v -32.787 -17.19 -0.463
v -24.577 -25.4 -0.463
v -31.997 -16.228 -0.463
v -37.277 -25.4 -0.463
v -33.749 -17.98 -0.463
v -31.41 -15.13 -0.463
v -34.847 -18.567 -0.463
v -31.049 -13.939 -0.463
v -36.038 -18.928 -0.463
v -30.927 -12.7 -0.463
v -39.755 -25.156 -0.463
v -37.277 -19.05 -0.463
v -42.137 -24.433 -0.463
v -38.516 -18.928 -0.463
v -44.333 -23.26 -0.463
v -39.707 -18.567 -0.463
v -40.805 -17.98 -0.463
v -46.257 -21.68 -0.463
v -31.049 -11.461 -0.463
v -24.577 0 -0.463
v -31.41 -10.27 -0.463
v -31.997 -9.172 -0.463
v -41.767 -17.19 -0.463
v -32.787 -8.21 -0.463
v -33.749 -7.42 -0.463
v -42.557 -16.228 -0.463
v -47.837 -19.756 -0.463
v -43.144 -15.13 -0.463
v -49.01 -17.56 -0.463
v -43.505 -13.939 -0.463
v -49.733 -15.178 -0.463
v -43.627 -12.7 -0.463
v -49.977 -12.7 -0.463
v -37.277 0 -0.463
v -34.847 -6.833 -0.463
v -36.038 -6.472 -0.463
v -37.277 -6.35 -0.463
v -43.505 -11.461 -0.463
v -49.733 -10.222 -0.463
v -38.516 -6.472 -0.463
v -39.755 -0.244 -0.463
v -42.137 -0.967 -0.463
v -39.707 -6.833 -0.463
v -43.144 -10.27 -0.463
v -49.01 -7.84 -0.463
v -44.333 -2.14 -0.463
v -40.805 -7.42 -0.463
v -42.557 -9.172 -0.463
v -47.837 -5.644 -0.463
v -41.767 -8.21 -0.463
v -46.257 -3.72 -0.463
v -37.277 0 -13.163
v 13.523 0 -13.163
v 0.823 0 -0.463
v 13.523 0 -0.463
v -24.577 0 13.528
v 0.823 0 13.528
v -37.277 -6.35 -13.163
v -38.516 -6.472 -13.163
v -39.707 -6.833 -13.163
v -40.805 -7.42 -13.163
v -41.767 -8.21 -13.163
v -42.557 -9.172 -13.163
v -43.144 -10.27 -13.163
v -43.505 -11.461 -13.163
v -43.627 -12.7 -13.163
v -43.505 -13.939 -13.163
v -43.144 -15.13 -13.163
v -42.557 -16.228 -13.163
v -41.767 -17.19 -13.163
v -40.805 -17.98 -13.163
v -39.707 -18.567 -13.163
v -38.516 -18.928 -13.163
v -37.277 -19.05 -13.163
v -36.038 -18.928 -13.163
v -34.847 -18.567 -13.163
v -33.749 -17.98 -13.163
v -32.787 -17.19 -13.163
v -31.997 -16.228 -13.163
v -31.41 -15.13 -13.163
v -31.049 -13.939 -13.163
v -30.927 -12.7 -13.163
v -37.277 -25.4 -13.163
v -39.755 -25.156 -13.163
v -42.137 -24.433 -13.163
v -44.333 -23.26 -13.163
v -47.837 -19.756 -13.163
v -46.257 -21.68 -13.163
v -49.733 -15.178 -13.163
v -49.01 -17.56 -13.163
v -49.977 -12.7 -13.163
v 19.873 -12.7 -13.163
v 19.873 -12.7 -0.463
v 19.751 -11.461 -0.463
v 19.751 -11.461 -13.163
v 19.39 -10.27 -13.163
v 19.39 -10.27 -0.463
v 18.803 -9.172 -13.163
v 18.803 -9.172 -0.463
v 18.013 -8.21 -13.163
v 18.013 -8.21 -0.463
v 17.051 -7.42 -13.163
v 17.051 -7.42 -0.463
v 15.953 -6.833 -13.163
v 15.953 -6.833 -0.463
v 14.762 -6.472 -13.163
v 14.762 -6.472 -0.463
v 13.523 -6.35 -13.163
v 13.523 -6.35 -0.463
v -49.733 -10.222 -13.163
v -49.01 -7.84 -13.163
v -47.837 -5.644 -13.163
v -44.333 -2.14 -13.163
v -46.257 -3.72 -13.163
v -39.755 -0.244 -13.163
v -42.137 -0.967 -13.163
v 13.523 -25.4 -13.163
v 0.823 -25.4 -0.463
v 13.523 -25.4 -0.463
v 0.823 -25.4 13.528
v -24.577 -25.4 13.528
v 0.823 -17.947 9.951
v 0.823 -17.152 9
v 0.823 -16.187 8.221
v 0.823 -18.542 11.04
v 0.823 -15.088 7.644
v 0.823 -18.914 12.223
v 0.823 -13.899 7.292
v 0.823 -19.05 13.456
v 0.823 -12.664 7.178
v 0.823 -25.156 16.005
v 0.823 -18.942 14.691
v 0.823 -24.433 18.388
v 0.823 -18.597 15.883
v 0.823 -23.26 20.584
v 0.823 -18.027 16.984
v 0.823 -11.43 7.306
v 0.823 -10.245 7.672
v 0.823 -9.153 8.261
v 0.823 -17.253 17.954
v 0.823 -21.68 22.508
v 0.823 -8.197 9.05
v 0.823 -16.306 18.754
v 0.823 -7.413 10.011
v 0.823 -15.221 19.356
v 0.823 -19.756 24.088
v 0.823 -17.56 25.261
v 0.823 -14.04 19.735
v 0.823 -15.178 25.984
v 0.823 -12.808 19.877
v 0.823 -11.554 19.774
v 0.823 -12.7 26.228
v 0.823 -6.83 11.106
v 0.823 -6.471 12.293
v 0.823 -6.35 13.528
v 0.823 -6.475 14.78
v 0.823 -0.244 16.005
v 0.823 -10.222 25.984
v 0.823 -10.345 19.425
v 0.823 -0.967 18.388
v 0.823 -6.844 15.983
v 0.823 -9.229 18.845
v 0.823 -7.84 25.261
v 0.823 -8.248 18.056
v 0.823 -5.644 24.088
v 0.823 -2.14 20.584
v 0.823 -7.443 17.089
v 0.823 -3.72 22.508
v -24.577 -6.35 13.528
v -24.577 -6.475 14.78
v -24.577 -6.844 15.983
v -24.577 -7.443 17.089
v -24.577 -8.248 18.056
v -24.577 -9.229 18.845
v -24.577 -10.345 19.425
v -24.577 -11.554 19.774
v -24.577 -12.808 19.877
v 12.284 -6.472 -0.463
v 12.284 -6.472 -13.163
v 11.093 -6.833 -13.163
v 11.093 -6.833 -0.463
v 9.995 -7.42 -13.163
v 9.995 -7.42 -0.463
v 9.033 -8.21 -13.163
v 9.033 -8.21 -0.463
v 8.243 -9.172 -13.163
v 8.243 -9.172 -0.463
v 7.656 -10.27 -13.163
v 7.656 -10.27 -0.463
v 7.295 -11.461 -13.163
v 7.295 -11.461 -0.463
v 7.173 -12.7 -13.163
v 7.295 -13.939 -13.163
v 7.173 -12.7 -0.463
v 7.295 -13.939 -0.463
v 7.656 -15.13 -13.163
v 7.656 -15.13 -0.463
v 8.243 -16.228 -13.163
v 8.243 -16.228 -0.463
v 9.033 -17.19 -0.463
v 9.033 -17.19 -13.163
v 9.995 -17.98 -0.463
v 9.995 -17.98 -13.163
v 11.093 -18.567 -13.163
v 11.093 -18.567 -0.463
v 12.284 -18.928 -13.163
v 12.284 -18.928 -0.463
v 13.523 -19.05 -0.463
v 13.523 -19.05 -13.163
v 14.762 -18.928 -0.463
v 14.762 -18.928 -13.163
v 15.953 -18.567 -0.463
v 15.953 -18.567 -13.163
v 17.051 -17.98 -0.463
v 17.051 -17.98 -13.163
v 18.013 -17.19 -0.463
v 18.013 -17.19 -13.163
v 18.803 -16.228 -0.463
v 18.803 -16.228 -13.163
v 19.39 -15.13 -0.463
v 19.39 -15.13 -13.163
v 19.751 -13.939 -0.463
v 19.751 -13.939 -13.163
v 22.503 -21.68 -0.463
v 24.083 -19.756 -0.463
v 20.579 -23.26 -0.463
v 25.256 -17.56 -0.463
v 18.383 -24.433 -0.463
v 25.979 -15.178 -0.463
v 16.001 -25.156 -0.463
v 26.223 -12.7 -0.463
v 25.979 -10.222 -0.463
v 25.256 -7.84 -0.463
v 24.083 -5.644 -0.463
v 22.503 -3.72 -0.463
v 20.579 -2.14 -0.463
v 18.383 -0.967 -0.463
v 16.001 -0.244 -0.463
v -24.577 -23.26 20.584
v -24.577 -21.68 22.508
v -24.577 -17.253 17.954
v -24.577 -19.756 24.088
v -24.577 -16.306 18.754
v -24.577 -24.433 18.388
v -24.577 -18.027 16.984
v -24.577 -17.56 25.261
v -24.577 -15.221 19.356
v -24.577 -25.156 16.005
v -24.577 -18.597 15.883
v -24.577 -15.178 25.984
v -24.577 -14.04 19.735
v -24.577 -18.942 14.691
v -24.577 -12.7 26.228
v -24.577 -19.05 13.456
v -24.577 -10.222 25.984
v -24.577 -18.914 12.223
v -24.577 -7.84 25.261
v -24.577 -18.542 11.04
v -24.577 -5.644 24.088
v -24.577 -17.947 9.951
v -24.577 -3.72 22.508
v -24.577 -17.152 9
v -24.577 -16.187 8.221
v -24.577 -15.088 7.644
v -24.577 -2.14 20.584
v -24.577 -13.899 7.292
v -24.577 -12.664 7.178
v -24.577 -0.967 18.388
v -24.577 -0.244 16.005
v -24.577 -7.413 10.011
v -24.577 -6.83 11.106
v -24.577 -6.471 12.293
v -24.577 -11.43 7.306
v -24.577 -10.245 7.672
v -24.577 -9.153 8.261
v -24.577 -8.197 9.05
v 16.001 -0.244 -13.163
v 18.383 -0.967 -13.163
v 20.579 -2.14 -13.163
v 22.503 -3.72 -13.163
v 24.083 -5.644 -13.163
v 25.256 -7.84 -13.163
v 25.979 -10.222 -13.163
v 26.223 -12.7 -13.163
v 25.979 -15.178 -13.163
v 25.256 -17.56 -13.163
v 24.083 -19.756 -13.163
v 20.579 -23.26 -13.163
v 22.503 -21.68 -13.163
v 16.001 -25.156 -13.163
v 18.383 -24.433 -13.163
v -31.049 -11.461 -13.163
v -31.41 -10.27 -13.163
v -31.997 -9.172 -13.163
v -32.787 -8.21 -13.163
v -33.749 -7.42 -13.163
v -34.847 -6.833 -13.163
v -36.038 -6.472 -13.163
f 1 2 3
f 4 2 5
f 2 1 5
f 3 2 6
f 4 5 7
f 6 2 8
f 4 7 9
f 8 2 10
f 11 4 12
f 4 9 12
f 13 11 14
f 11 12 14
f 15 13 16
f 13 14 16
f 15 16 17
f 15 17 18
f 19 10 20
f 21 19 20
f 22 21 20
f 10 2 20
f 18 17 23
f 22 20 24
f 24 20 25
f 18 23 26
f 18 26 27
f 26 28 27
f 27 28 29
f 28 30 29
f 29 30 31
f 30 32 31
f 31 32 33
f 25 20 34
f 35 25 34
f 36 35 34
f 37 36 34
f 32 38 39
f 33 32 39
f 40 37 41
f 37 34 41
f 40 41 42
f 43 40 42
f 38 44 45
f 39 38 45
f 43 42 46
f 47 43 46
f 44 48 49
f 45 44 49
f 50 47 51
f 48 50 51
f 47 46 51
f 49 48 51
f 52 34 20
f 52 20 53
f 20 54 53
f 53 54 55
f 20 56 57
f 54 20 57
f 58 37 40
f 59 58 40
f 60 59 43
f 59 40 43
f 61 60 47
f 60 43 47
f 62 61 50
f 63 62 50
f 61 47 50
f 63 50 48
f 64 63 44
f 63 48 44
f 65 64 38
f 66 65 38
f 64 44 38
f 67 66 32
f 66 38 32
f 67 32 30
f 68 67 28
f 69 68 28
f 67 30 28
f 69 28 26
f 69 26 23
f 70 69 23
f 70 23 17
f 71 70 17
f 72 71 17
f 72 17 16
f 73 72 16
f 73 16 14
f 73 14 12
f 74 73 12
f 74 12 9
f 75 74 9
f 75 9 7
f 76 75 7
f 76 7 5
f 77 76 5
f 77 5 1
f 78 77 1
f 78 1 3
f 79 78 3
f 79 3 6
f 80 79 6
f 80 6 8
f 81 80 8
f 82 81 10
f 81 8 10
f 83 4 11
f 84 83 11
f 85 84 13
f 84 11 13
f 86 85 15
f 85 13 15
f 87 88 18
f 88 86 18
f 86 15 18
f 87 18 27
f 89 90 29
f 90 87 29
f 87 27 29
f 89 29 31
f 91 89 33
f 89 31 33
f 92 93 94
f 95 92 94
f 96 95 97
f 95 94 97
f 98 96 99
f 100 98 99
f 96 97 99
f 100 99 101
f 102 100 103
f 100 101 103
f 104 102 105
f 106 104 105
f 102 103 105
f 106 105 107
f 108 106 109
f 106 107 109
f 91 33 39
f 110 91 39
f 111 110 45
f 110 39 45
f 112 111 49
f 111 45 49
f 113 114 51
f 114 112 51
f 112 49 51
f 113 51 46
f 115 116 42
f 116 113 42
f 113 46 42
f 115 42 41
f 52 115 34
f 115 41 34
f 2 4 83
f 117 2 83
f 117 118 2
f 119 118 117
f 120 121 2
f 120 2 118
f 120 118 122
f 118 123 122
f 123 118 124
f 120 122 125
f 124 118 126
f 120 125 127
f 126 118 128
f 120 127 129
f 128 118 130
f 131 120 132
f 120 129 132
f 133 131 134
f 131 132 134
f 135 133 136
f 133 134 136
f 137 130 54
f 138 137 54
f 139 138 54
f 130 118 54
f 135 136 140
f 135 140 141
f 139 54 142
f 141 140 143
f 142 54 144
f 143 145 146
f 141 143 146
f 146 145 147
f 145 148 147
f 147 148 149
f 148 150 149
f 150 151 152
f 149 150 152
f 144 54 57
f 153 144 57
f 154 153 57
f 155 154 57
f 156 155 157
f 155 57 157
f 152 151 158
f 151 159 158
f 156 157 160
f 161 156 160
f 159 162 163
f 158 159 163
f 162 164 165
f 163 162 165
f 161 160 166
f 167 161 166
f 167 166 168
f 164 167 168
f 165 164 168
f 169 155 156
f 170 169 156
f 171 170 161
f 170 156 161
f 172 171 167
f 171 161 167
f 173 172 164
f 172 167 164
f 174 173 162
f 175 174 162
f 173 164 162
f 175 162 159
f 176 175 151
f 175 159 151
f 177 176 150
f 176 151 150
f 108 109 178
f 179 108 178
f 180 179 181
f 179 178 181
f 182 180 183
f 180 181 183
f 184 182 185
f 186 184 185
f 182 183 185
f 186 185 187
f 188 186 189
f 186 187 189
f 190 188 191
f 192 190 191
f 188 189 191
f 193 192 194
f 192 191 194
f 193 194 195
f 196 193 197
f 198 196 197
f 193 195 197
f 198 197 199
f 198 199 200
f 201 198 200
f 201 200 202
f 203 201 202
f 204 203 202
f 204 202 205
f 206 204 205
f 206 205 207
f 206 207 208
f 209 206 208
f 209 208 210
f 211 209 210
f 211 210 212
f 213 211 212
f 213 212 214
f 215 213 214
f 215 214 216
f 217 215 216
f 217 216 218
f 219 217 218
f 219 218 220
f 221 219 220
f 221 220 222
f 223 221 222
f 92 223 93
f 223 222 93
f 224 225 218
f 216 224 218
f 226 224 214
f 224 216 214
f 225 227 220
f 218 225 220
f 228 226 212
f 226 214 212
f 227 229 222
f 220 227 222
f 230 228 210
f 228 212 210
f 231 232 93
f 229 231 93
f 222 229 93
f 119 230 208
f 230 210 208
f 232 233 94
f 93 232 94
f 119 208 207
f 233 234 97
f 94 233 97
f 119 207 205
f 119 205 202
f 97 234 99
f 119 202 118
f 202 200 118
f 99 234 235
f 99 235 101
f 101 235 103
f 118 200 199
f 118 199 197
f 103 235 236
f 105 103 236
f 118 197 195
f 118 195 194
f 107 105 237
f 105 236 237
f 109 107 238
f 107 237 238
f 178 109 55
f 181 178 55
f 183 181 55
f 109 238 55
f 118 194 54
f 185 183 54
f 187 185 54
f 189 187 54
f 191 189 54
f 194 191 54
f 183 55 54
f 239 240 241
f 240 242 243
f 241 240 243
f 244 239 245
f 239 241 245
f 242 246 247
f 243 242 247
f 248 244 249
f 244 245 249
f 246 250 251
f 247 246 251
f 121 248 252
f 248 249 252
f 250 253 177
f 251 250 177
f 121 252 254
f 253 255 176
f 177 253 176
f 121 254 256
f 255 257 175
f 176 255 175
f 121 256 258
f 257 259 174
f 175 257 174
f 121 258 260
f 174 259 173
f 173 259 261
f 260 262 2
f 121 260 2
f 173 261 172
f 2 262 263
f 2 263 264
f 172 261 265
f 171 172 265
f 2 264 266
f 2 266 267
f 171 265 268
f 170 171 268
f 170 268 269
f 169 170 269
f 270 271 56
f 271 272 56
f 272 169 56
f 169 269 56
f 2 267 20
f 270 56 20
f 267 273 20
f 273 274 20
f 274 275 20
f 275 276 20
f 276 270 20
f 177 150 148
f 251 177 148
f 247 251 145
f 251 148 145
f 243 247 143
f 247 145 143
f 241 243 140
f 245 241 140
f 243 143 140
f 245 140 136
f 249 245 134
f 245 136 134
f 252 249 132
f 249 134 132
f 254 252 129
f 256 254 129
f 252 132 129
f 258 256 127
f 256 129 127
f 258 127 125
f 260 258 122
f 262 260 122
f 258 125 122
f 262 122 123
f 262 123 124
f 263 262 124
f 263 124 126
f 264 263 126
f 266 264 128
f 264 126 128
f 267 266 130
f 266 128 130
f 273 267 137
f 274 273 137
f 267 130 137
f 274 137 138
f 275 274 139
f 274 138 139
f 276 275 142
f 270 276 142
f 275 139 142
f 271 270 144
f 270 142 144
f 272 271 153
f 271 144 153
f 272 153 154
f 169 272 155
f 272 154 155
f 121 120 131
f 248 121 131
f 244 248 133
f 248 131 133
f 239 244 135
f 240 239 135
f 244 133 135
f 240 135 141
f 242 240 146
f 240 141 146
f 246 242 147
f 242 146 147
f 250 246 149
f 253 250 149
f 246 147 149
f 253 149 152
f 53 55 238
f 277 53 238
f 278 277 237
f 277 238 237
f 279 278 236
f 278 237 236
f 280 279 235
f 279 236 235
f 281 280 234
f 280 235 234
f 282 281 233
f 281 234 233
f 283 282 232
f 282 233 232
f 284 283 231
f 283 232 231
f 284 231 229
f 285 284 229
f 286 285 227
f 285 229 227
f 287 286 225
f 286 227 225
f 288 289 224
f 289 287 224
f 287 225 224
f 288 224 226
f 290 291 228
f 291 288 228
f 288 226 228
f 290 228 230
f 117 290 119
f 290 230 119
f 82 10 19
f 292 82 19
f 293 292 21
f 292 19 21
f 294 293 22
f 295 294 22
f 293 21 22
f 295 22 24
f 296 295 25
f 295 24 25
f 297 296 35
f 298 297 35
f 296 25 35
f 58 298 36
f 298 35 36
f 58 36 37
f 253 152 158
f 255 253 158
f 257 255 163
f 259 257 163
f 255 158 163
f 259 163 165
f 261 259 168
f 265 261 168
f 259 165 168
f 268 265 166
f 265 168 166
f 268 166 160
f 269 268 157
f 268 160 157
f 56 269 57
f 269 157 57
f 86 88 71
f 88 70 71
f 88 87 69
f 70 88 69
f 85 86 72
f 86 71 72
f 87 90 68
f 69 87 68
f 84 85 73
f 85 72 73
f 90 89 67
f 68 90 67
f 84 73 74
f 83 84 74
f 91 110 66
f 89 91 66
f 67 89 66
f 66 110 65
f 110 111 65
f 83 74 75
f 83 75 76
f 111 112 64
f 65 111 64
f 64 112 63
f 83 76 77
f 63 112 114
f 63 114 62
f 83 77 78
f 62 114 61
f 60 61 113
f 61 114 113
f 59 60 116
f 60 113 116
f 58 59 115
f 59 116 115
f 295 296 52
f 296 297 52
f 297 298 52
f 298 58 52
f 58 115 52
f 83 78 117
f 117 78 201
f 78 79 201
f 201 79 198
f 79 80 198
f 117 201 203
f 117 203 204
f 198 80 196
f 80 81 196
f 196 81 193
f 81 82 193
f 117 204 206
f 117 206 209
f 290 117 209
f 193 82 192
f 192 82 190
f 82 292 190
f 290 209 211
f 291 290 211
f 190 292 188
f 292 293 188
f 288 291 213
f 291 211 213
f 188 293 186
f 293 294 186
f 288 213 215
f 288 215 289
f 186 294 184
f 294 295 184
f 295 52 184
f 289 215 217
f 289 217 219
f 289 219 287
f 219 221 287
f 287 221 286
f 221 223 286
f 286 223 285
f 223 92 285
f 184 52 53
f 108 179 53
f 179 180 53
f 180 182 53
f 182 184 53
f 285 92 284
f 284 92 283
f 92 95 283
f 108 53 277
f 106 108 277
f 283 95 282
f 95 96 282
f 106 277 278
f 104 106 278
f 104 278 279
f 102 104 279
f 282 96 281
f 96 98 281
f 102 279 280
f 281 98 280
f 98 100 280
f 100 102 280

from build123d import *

# Parameters (mm, degrees)
F1_DEPTH  = 25.4
F3_DEPTH  = 25.4
F5_DEPTH  = 25.4
F7_DEPTH  = 25.4
F9_DEPTH  = 25.4
F11_DEPTH = 25.4
F13_DEPTH = 25.4
F15_DEPTH = 25.4


with BuildPart() as f1:
    # F0 (on Front) → F1 (new body)
    with BuildSketch(Plane.XZ):
        Polygon((-49.976994, -0.463082), (-49.976994, -13.163082), (26.223006, -13.163082), (26.223006, -0.463082), (0.823006, -0.463082), (0.823006, 26.227836), (-24.576994, 26.227836), (-24.576994, -0.463082), align=None)
    extrude(amount=F1_DEPTH)

    # F2 (on face) → F3 (cut)
    with BuildSketch(Plane.YZ.offset(0.823006)):
        with BuildLine():
            Line((-25.4, 26.227836), (-25.4, 13.527836))
            ThreePointArc((-25.4, 13.527836), (-21.680256, 22.508093), (-12.7, 26.227836))
            Line((-12.7, 26.227836), (-25.4, 26.227836))
        make_face()
        with BuildLine():
            Line((0, 26.227836), (-12.7, 26.227836))
            ThreePointArc((-12.7, 26.227836), (-3.719744, 22.508093), (0, 13.527836))
            Line((0, 13.527836), (0, 26.227836))
        make_face()
    extrude(amount=-F3_DEPTH, mode=Mode.SUBTRACT)

    # F4 (on face) → F5 (cut)
    with BuildSketch(Plane.XY.offset(-0.463082)):
        with BuildLine():
            Line((26.223006, 0), (13.523006, 0))
            ThreePointArc((13.523006, 0), (22.503262, -3.719744), (26.223006, -12.7))
            Line((26.223006, -12.7), (26.223006, 0))
        make_face()
        with BuildLine():
            Line((26.223006, -25.4), (26.223006, -12.7))
            ThreePointArc((26.223006, -12.7), (22.503262, -21.680256), (13.523006, -25.4))
            Line((13.523006, -25.4), (26.223006, -25.4))
        make_face()
    extrude(amount=-F5_DEPTH, mode=Mode.SUBTRACT)

    # F6 (on face) → F7 (cut)
    with BuildSketch(Plane.XY.offset(-0.463082)):
        with BuildLine():
            ThreePointArc((-37.276994, -25.4), (-46.25725, -21.680256), (-49.976994, -12.7))
            Line((-49.976994, -12.7), (-49.976994, -25.4))
            Line((-49.976994, -25.4), (-37.276994, -25.4))
        make_face()
    extrude(amount=-F7_DEPTH, mode=Mode.SUBTRACT)

    # F8 (on face) → F9 (cut)
    with BuildSketch(Plane.XY.offset(-0.463082)):
        with BuildLine():
            ThreePointArc((-37.276994, -25.4), (-46.25725, -21.680256), (-49.976994, -12.7))
            Line((-49.976994, -12.7), (-49.976994, -25.4))
            Line((-49.976994, -25.4), (-37.276994, -25.4))
        make_face()
        with BuildLine():
            ThreePointArc((-49.976994, -12.7), (-46.25725, -3.719744), (-37.276994, 0))
            Line((-37.276994, 0), (-49.976994, 0))
            Line((-49.976994, 0), (-49.976994, -12.7))
        make_face()
    extrude(amount=-F9_DEPTH, mode=Mode.SUBTRACT)

    # F10 (on face) → F11 (cut)
    with BuildSketch(Plane.XY.offset(-0.463082)):
        with BuildLine():
            ThreePointArc((-37.276994, -6.35), (-41.767122, -17.190128), (-30.926994, -12.7))
            ThreePointArc((-30.926994, -12.7), (-32.786866, -8.209872), (-37.276994, -6.35))
        make_face()
    extrude(amount=-F11_DEPTH, mode=Mode.SUBTRACT)

    # F12 (on face) → F13 (cut)
    with BuildSketch(Plane.XY.offset(-0.463082)):
        with BuildLine():
            ThreePointArc((13.523006, -6.35), (9.032878, -17.190128), (19.873006, -12.7))
            ThreePointArc((19.873006, -12.7), (18.013134, -8.209872), (13.523006, -6.35))
        make_face()
    extrude(amount=-F13_DEPTH, mode=Mode.SUBTRACT)

    # F14 (on face) → F15 (cut)
    with BuildSketch(Plane.YZ.offset(0.823006)):
        with BuildLine():
            ThreePointArc((-12.80825, 19.876914), (-17.151691, 8.999598), (-6.35, 13.527836))
            ThreePointArc((-6.35, 13.527836), (-8.248309, 18.056075), (-12.80825, 19.876914))
        make_face()
    extrude(amount=-F15_DEPTH, mode=Mode.SUBTRACT)


solid = f1.part
